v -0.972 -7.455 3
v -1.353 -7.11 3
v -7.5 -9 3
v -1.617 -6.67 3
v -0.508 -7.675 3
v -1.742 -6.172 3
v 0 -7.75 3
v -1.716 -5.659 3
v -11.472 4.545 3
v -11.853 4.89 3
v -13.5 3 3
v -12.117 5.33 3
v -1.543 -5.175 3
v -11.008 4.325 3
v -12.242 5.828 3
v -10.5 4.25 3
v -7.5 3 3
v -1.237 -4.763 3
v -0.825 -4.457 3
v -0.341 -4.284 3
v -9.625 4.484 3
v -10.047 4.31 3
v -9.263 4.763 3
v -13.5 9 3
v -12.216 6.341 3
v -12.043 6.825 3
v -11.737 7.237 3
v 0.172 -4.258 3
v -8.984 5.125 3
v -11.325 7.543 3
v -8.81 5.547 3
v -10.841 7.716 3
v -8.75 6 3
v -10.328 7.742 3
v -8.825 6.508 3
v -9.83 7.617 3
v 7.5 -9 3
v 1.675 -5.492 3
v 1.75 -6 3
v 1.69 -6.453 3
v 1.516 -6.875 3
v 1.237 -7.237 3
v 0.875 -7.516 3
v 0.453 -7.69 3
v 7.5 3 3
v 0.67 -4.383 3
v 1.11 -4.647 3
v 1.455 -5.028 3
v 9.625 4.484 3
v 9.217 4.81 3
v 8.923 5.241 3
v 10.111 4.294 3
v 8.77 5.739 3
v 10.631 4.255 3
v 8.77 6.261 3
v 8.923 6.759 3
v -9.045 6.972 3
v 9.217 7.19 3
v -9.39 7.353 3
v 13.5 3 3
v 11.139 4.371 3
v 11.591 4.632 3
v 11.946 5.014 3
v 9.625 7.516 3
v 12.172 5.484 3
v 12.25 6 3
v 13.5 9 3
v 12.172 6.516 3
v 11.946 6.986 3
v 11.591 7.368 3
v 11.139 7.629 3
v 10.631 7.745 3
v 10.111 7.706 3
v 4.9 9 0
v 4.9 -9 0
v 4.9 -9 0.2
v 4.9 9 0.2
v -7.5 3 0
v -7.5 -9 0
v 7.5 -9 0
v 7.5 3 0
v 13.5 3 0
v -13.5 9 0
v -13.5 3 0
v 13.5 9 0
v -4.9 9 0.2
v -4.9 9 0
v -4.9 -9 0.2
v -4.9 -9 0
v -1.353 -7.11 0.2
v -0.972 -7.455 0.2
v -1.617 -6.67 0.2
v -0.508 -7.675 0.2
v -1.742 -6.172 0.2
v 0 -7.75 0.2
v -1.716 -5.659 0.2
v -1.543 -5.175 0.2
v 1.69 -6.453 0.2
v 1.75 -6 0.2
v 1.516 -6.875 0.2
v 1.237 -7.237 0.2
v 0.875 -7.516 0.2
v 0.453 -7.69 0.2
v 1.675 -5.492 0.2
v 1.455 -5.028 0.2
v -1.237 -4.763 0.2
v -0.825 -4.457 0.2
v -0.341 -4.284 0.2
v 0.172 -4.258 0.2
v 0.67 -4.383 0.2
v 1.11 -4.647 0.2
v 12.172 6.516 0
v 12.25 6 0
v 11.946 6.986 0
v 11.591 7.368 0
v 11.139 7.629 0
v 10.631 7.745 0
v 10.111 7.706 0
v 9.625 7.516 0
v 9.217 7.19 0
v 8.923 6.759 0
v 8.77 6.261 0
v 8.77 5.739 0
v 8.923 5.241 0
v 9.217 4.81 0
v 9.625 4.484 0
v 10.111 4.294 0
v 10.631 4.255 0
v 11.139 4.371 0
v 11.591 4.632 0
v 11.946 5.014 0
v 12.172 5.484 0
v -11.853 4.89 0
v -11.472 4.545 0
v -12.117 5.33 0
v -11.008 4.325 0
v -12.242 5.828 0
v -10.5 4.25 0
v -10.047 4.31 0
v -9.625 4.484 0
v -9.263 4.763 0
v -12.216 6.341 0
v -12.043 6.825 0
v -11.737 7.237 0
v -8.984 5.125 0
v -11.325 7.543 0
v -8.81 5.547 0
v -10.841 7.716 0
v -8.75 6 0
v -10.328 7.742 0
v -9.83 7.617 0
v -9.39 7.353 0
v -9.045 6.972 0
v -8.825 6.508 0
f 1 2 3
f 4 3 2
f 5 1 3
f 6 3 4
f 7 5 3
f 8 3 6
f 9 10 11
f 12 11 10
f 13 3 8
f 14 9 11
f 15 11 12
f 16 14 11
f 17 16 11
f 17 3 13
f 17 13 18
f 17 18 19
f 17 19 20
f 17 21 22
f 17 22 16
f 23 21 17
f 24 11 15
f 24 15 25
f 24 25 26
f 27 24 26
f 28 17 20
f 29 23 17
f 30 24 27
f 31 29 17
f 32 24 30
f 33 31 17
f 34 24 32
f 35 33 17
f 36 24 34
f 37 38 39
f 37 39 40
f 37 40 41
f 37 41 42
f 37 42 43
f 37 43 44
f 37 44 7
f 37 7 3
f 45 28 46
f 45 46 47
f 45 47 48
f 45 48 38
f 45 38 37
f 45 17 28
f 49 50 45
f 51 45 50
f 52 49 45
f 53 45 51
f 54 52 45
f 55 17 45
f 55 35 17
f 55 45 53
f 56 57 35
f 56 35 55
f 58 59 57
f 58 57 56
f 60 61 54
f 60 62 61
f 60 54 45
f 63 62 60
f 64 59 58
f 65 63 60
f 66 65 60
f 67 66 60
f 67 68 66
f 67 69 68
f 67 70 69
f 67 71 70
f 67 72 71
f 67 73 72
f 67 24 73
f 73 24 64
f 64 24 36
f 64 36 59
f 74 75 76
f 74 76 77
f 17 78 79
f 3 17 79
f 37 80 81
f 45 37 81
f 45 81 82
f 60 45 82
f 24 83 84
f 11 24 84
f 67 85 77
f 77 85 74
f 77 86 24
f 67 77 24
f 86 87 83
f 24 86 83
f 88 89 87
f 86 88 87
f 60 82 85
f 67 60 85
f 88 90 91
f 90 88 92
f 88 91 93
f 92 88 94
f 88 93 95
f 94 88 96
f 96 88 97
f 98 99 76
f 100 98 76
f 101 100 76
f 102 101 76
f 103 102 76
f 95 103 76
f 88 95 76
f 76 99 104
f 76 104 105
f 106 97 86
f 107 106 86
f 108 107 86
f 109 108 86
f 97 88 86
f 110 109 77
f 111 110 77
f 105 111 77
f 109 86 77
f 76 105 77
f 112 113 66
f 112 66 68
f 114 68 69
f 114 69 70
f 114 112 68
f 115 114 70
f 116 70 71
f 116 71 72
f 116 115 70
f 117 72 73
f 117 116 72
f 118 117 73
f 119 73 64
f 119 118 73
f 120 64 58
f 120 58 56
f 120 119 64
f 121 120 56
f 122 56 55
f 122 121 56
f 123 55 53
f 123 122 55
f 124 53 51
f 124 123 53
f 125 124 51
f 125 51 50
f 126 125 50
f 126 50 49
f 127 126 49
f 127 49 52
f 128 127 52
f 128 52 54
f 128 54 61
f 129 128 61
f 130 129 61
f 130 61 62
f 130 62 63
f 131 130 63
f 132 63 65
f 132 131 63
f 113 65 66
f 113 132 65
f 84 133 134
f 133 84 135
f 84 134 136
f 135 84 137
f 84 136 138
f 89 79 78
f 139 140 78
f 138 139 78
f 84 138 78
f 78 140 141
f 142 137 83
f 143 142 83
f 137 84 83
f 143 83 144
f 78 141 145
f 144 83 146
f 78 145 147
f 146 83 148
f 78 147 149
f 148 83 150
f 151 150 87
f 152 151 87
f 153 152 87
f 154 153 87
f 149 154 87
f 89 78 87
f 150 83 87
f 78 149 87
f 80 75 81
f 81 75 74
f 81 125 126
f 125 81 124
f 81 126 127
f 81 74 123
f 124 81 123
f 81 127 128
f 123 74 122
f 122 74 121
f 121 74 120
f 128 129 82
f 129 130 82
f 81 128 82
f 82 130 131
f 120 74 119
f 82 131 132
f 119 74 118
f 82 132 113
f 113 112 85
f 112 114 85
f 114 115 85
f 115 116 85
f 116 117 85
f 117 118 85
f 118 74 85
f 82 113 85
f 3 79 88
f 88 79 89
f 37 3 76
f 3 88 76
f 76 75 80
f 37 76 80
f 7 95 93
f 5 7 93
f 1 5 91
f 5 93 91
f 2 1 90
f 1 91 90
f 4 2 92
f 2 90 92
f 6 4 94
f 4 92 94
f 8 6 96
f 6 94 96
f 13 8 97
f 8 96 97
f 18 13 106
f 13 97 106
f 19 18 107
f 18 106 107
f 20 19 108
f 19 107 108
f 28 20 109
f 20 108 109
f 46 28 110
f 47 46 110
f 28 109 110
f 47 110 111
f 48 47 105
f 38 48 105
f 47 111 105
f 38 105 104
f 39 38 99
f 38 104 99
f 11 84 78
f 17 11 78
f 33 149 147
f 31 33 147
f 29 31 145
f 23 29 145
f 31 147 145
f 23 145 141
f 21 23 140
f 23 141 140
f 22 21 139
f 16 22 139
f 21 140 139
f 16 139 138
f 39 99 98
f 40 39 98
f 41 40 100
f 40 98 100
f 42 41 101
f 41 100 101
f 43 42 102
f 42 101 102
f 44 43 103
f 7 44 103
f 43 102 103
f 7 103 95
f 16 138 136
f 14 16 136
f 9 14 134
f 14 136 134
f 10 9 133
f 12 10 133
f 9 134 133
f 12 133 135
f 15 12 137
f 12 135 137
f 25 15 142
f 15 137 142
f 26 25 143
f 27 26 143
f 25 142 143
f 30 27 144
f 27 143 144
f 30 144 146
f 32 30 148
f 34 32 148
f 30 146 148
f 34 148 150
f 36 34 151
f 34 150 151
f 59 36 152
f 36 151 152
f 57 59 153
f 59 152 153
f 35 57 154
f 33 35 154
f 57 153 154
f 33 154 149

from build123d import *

# Parameters (mm, degrees)
F0_W     = 6
F0_H     = 6
F0_R     = 1.75
F2_DEPTH = 3
F1_W     = 9.8
F1_H     = 18
F3_DEPTH = 0.2


with BuildPart() as f2:
    # F0 (on Top) → F2 (new body)
    with BuildSketch(Plane.XY):
        with BuildLine():
            ThreePointArc((1.75, -6), (-1.237437, -4.762563), (0, -7.75))
            ThreePointArc((0, -7.75), (1.237437, -7.237437), (1.75, -6))
        make_face()
        Polygon((7.5, 9), (-7.5, 9), (-7.5, 3), (-7.5, -9), (0, -9), (7.5, -9), (7.5, 3), align=None)
        with BuildLine():
            ThreePointArc((1.75, -6), (1.237437, -7.237437), (0, -7.75))
            ThreePointArc((0, -7.75), (-1.237437, -4.762563), (1.75, -6))
        make_face(mode=Mode.SUBTRACT)
        with BuildLine():
            ThreePointArc((-8.75, 6), (-11.737437, 7.237437), (-10.5, 4.25))
            ThreePointArc((-10.5, 4.25), (-9.262563, 4.762563), (-8.75, 6))
        make_face()
        Polygon((-7.5, 3), (-7.5, 9), (-13.5, 9), (-13.5, 3), (-10.5, 3), align=None)
        with BuildLine():
            ThreePointArc((-8.75, 6), (-9.262563, 4.762563), (-10.5, 4.25))
            ThreePointArc((-10.5, 4.25), (-11.737437, 7.237437), (-8.75, 6))
        make_face(mode=Mode.SUBTRACT)
        with Locations((10.5, 6)):
            Rectangle(F0_W, F0_H)
        with Locations((10.5, 6)):
            Circle(F0_R, mode=Mode.SUBTRACT)
    extrude(amount=F2_DEPTH)

    # F1 (on face) → F3 (cut)
    with BuildSketch(Plane.XY):
        Rectangle(F1_W, F1_H)
    extrude(amount=F3_DEPTH, mode=Mode.SUBTRACT)


solid = f2.part
